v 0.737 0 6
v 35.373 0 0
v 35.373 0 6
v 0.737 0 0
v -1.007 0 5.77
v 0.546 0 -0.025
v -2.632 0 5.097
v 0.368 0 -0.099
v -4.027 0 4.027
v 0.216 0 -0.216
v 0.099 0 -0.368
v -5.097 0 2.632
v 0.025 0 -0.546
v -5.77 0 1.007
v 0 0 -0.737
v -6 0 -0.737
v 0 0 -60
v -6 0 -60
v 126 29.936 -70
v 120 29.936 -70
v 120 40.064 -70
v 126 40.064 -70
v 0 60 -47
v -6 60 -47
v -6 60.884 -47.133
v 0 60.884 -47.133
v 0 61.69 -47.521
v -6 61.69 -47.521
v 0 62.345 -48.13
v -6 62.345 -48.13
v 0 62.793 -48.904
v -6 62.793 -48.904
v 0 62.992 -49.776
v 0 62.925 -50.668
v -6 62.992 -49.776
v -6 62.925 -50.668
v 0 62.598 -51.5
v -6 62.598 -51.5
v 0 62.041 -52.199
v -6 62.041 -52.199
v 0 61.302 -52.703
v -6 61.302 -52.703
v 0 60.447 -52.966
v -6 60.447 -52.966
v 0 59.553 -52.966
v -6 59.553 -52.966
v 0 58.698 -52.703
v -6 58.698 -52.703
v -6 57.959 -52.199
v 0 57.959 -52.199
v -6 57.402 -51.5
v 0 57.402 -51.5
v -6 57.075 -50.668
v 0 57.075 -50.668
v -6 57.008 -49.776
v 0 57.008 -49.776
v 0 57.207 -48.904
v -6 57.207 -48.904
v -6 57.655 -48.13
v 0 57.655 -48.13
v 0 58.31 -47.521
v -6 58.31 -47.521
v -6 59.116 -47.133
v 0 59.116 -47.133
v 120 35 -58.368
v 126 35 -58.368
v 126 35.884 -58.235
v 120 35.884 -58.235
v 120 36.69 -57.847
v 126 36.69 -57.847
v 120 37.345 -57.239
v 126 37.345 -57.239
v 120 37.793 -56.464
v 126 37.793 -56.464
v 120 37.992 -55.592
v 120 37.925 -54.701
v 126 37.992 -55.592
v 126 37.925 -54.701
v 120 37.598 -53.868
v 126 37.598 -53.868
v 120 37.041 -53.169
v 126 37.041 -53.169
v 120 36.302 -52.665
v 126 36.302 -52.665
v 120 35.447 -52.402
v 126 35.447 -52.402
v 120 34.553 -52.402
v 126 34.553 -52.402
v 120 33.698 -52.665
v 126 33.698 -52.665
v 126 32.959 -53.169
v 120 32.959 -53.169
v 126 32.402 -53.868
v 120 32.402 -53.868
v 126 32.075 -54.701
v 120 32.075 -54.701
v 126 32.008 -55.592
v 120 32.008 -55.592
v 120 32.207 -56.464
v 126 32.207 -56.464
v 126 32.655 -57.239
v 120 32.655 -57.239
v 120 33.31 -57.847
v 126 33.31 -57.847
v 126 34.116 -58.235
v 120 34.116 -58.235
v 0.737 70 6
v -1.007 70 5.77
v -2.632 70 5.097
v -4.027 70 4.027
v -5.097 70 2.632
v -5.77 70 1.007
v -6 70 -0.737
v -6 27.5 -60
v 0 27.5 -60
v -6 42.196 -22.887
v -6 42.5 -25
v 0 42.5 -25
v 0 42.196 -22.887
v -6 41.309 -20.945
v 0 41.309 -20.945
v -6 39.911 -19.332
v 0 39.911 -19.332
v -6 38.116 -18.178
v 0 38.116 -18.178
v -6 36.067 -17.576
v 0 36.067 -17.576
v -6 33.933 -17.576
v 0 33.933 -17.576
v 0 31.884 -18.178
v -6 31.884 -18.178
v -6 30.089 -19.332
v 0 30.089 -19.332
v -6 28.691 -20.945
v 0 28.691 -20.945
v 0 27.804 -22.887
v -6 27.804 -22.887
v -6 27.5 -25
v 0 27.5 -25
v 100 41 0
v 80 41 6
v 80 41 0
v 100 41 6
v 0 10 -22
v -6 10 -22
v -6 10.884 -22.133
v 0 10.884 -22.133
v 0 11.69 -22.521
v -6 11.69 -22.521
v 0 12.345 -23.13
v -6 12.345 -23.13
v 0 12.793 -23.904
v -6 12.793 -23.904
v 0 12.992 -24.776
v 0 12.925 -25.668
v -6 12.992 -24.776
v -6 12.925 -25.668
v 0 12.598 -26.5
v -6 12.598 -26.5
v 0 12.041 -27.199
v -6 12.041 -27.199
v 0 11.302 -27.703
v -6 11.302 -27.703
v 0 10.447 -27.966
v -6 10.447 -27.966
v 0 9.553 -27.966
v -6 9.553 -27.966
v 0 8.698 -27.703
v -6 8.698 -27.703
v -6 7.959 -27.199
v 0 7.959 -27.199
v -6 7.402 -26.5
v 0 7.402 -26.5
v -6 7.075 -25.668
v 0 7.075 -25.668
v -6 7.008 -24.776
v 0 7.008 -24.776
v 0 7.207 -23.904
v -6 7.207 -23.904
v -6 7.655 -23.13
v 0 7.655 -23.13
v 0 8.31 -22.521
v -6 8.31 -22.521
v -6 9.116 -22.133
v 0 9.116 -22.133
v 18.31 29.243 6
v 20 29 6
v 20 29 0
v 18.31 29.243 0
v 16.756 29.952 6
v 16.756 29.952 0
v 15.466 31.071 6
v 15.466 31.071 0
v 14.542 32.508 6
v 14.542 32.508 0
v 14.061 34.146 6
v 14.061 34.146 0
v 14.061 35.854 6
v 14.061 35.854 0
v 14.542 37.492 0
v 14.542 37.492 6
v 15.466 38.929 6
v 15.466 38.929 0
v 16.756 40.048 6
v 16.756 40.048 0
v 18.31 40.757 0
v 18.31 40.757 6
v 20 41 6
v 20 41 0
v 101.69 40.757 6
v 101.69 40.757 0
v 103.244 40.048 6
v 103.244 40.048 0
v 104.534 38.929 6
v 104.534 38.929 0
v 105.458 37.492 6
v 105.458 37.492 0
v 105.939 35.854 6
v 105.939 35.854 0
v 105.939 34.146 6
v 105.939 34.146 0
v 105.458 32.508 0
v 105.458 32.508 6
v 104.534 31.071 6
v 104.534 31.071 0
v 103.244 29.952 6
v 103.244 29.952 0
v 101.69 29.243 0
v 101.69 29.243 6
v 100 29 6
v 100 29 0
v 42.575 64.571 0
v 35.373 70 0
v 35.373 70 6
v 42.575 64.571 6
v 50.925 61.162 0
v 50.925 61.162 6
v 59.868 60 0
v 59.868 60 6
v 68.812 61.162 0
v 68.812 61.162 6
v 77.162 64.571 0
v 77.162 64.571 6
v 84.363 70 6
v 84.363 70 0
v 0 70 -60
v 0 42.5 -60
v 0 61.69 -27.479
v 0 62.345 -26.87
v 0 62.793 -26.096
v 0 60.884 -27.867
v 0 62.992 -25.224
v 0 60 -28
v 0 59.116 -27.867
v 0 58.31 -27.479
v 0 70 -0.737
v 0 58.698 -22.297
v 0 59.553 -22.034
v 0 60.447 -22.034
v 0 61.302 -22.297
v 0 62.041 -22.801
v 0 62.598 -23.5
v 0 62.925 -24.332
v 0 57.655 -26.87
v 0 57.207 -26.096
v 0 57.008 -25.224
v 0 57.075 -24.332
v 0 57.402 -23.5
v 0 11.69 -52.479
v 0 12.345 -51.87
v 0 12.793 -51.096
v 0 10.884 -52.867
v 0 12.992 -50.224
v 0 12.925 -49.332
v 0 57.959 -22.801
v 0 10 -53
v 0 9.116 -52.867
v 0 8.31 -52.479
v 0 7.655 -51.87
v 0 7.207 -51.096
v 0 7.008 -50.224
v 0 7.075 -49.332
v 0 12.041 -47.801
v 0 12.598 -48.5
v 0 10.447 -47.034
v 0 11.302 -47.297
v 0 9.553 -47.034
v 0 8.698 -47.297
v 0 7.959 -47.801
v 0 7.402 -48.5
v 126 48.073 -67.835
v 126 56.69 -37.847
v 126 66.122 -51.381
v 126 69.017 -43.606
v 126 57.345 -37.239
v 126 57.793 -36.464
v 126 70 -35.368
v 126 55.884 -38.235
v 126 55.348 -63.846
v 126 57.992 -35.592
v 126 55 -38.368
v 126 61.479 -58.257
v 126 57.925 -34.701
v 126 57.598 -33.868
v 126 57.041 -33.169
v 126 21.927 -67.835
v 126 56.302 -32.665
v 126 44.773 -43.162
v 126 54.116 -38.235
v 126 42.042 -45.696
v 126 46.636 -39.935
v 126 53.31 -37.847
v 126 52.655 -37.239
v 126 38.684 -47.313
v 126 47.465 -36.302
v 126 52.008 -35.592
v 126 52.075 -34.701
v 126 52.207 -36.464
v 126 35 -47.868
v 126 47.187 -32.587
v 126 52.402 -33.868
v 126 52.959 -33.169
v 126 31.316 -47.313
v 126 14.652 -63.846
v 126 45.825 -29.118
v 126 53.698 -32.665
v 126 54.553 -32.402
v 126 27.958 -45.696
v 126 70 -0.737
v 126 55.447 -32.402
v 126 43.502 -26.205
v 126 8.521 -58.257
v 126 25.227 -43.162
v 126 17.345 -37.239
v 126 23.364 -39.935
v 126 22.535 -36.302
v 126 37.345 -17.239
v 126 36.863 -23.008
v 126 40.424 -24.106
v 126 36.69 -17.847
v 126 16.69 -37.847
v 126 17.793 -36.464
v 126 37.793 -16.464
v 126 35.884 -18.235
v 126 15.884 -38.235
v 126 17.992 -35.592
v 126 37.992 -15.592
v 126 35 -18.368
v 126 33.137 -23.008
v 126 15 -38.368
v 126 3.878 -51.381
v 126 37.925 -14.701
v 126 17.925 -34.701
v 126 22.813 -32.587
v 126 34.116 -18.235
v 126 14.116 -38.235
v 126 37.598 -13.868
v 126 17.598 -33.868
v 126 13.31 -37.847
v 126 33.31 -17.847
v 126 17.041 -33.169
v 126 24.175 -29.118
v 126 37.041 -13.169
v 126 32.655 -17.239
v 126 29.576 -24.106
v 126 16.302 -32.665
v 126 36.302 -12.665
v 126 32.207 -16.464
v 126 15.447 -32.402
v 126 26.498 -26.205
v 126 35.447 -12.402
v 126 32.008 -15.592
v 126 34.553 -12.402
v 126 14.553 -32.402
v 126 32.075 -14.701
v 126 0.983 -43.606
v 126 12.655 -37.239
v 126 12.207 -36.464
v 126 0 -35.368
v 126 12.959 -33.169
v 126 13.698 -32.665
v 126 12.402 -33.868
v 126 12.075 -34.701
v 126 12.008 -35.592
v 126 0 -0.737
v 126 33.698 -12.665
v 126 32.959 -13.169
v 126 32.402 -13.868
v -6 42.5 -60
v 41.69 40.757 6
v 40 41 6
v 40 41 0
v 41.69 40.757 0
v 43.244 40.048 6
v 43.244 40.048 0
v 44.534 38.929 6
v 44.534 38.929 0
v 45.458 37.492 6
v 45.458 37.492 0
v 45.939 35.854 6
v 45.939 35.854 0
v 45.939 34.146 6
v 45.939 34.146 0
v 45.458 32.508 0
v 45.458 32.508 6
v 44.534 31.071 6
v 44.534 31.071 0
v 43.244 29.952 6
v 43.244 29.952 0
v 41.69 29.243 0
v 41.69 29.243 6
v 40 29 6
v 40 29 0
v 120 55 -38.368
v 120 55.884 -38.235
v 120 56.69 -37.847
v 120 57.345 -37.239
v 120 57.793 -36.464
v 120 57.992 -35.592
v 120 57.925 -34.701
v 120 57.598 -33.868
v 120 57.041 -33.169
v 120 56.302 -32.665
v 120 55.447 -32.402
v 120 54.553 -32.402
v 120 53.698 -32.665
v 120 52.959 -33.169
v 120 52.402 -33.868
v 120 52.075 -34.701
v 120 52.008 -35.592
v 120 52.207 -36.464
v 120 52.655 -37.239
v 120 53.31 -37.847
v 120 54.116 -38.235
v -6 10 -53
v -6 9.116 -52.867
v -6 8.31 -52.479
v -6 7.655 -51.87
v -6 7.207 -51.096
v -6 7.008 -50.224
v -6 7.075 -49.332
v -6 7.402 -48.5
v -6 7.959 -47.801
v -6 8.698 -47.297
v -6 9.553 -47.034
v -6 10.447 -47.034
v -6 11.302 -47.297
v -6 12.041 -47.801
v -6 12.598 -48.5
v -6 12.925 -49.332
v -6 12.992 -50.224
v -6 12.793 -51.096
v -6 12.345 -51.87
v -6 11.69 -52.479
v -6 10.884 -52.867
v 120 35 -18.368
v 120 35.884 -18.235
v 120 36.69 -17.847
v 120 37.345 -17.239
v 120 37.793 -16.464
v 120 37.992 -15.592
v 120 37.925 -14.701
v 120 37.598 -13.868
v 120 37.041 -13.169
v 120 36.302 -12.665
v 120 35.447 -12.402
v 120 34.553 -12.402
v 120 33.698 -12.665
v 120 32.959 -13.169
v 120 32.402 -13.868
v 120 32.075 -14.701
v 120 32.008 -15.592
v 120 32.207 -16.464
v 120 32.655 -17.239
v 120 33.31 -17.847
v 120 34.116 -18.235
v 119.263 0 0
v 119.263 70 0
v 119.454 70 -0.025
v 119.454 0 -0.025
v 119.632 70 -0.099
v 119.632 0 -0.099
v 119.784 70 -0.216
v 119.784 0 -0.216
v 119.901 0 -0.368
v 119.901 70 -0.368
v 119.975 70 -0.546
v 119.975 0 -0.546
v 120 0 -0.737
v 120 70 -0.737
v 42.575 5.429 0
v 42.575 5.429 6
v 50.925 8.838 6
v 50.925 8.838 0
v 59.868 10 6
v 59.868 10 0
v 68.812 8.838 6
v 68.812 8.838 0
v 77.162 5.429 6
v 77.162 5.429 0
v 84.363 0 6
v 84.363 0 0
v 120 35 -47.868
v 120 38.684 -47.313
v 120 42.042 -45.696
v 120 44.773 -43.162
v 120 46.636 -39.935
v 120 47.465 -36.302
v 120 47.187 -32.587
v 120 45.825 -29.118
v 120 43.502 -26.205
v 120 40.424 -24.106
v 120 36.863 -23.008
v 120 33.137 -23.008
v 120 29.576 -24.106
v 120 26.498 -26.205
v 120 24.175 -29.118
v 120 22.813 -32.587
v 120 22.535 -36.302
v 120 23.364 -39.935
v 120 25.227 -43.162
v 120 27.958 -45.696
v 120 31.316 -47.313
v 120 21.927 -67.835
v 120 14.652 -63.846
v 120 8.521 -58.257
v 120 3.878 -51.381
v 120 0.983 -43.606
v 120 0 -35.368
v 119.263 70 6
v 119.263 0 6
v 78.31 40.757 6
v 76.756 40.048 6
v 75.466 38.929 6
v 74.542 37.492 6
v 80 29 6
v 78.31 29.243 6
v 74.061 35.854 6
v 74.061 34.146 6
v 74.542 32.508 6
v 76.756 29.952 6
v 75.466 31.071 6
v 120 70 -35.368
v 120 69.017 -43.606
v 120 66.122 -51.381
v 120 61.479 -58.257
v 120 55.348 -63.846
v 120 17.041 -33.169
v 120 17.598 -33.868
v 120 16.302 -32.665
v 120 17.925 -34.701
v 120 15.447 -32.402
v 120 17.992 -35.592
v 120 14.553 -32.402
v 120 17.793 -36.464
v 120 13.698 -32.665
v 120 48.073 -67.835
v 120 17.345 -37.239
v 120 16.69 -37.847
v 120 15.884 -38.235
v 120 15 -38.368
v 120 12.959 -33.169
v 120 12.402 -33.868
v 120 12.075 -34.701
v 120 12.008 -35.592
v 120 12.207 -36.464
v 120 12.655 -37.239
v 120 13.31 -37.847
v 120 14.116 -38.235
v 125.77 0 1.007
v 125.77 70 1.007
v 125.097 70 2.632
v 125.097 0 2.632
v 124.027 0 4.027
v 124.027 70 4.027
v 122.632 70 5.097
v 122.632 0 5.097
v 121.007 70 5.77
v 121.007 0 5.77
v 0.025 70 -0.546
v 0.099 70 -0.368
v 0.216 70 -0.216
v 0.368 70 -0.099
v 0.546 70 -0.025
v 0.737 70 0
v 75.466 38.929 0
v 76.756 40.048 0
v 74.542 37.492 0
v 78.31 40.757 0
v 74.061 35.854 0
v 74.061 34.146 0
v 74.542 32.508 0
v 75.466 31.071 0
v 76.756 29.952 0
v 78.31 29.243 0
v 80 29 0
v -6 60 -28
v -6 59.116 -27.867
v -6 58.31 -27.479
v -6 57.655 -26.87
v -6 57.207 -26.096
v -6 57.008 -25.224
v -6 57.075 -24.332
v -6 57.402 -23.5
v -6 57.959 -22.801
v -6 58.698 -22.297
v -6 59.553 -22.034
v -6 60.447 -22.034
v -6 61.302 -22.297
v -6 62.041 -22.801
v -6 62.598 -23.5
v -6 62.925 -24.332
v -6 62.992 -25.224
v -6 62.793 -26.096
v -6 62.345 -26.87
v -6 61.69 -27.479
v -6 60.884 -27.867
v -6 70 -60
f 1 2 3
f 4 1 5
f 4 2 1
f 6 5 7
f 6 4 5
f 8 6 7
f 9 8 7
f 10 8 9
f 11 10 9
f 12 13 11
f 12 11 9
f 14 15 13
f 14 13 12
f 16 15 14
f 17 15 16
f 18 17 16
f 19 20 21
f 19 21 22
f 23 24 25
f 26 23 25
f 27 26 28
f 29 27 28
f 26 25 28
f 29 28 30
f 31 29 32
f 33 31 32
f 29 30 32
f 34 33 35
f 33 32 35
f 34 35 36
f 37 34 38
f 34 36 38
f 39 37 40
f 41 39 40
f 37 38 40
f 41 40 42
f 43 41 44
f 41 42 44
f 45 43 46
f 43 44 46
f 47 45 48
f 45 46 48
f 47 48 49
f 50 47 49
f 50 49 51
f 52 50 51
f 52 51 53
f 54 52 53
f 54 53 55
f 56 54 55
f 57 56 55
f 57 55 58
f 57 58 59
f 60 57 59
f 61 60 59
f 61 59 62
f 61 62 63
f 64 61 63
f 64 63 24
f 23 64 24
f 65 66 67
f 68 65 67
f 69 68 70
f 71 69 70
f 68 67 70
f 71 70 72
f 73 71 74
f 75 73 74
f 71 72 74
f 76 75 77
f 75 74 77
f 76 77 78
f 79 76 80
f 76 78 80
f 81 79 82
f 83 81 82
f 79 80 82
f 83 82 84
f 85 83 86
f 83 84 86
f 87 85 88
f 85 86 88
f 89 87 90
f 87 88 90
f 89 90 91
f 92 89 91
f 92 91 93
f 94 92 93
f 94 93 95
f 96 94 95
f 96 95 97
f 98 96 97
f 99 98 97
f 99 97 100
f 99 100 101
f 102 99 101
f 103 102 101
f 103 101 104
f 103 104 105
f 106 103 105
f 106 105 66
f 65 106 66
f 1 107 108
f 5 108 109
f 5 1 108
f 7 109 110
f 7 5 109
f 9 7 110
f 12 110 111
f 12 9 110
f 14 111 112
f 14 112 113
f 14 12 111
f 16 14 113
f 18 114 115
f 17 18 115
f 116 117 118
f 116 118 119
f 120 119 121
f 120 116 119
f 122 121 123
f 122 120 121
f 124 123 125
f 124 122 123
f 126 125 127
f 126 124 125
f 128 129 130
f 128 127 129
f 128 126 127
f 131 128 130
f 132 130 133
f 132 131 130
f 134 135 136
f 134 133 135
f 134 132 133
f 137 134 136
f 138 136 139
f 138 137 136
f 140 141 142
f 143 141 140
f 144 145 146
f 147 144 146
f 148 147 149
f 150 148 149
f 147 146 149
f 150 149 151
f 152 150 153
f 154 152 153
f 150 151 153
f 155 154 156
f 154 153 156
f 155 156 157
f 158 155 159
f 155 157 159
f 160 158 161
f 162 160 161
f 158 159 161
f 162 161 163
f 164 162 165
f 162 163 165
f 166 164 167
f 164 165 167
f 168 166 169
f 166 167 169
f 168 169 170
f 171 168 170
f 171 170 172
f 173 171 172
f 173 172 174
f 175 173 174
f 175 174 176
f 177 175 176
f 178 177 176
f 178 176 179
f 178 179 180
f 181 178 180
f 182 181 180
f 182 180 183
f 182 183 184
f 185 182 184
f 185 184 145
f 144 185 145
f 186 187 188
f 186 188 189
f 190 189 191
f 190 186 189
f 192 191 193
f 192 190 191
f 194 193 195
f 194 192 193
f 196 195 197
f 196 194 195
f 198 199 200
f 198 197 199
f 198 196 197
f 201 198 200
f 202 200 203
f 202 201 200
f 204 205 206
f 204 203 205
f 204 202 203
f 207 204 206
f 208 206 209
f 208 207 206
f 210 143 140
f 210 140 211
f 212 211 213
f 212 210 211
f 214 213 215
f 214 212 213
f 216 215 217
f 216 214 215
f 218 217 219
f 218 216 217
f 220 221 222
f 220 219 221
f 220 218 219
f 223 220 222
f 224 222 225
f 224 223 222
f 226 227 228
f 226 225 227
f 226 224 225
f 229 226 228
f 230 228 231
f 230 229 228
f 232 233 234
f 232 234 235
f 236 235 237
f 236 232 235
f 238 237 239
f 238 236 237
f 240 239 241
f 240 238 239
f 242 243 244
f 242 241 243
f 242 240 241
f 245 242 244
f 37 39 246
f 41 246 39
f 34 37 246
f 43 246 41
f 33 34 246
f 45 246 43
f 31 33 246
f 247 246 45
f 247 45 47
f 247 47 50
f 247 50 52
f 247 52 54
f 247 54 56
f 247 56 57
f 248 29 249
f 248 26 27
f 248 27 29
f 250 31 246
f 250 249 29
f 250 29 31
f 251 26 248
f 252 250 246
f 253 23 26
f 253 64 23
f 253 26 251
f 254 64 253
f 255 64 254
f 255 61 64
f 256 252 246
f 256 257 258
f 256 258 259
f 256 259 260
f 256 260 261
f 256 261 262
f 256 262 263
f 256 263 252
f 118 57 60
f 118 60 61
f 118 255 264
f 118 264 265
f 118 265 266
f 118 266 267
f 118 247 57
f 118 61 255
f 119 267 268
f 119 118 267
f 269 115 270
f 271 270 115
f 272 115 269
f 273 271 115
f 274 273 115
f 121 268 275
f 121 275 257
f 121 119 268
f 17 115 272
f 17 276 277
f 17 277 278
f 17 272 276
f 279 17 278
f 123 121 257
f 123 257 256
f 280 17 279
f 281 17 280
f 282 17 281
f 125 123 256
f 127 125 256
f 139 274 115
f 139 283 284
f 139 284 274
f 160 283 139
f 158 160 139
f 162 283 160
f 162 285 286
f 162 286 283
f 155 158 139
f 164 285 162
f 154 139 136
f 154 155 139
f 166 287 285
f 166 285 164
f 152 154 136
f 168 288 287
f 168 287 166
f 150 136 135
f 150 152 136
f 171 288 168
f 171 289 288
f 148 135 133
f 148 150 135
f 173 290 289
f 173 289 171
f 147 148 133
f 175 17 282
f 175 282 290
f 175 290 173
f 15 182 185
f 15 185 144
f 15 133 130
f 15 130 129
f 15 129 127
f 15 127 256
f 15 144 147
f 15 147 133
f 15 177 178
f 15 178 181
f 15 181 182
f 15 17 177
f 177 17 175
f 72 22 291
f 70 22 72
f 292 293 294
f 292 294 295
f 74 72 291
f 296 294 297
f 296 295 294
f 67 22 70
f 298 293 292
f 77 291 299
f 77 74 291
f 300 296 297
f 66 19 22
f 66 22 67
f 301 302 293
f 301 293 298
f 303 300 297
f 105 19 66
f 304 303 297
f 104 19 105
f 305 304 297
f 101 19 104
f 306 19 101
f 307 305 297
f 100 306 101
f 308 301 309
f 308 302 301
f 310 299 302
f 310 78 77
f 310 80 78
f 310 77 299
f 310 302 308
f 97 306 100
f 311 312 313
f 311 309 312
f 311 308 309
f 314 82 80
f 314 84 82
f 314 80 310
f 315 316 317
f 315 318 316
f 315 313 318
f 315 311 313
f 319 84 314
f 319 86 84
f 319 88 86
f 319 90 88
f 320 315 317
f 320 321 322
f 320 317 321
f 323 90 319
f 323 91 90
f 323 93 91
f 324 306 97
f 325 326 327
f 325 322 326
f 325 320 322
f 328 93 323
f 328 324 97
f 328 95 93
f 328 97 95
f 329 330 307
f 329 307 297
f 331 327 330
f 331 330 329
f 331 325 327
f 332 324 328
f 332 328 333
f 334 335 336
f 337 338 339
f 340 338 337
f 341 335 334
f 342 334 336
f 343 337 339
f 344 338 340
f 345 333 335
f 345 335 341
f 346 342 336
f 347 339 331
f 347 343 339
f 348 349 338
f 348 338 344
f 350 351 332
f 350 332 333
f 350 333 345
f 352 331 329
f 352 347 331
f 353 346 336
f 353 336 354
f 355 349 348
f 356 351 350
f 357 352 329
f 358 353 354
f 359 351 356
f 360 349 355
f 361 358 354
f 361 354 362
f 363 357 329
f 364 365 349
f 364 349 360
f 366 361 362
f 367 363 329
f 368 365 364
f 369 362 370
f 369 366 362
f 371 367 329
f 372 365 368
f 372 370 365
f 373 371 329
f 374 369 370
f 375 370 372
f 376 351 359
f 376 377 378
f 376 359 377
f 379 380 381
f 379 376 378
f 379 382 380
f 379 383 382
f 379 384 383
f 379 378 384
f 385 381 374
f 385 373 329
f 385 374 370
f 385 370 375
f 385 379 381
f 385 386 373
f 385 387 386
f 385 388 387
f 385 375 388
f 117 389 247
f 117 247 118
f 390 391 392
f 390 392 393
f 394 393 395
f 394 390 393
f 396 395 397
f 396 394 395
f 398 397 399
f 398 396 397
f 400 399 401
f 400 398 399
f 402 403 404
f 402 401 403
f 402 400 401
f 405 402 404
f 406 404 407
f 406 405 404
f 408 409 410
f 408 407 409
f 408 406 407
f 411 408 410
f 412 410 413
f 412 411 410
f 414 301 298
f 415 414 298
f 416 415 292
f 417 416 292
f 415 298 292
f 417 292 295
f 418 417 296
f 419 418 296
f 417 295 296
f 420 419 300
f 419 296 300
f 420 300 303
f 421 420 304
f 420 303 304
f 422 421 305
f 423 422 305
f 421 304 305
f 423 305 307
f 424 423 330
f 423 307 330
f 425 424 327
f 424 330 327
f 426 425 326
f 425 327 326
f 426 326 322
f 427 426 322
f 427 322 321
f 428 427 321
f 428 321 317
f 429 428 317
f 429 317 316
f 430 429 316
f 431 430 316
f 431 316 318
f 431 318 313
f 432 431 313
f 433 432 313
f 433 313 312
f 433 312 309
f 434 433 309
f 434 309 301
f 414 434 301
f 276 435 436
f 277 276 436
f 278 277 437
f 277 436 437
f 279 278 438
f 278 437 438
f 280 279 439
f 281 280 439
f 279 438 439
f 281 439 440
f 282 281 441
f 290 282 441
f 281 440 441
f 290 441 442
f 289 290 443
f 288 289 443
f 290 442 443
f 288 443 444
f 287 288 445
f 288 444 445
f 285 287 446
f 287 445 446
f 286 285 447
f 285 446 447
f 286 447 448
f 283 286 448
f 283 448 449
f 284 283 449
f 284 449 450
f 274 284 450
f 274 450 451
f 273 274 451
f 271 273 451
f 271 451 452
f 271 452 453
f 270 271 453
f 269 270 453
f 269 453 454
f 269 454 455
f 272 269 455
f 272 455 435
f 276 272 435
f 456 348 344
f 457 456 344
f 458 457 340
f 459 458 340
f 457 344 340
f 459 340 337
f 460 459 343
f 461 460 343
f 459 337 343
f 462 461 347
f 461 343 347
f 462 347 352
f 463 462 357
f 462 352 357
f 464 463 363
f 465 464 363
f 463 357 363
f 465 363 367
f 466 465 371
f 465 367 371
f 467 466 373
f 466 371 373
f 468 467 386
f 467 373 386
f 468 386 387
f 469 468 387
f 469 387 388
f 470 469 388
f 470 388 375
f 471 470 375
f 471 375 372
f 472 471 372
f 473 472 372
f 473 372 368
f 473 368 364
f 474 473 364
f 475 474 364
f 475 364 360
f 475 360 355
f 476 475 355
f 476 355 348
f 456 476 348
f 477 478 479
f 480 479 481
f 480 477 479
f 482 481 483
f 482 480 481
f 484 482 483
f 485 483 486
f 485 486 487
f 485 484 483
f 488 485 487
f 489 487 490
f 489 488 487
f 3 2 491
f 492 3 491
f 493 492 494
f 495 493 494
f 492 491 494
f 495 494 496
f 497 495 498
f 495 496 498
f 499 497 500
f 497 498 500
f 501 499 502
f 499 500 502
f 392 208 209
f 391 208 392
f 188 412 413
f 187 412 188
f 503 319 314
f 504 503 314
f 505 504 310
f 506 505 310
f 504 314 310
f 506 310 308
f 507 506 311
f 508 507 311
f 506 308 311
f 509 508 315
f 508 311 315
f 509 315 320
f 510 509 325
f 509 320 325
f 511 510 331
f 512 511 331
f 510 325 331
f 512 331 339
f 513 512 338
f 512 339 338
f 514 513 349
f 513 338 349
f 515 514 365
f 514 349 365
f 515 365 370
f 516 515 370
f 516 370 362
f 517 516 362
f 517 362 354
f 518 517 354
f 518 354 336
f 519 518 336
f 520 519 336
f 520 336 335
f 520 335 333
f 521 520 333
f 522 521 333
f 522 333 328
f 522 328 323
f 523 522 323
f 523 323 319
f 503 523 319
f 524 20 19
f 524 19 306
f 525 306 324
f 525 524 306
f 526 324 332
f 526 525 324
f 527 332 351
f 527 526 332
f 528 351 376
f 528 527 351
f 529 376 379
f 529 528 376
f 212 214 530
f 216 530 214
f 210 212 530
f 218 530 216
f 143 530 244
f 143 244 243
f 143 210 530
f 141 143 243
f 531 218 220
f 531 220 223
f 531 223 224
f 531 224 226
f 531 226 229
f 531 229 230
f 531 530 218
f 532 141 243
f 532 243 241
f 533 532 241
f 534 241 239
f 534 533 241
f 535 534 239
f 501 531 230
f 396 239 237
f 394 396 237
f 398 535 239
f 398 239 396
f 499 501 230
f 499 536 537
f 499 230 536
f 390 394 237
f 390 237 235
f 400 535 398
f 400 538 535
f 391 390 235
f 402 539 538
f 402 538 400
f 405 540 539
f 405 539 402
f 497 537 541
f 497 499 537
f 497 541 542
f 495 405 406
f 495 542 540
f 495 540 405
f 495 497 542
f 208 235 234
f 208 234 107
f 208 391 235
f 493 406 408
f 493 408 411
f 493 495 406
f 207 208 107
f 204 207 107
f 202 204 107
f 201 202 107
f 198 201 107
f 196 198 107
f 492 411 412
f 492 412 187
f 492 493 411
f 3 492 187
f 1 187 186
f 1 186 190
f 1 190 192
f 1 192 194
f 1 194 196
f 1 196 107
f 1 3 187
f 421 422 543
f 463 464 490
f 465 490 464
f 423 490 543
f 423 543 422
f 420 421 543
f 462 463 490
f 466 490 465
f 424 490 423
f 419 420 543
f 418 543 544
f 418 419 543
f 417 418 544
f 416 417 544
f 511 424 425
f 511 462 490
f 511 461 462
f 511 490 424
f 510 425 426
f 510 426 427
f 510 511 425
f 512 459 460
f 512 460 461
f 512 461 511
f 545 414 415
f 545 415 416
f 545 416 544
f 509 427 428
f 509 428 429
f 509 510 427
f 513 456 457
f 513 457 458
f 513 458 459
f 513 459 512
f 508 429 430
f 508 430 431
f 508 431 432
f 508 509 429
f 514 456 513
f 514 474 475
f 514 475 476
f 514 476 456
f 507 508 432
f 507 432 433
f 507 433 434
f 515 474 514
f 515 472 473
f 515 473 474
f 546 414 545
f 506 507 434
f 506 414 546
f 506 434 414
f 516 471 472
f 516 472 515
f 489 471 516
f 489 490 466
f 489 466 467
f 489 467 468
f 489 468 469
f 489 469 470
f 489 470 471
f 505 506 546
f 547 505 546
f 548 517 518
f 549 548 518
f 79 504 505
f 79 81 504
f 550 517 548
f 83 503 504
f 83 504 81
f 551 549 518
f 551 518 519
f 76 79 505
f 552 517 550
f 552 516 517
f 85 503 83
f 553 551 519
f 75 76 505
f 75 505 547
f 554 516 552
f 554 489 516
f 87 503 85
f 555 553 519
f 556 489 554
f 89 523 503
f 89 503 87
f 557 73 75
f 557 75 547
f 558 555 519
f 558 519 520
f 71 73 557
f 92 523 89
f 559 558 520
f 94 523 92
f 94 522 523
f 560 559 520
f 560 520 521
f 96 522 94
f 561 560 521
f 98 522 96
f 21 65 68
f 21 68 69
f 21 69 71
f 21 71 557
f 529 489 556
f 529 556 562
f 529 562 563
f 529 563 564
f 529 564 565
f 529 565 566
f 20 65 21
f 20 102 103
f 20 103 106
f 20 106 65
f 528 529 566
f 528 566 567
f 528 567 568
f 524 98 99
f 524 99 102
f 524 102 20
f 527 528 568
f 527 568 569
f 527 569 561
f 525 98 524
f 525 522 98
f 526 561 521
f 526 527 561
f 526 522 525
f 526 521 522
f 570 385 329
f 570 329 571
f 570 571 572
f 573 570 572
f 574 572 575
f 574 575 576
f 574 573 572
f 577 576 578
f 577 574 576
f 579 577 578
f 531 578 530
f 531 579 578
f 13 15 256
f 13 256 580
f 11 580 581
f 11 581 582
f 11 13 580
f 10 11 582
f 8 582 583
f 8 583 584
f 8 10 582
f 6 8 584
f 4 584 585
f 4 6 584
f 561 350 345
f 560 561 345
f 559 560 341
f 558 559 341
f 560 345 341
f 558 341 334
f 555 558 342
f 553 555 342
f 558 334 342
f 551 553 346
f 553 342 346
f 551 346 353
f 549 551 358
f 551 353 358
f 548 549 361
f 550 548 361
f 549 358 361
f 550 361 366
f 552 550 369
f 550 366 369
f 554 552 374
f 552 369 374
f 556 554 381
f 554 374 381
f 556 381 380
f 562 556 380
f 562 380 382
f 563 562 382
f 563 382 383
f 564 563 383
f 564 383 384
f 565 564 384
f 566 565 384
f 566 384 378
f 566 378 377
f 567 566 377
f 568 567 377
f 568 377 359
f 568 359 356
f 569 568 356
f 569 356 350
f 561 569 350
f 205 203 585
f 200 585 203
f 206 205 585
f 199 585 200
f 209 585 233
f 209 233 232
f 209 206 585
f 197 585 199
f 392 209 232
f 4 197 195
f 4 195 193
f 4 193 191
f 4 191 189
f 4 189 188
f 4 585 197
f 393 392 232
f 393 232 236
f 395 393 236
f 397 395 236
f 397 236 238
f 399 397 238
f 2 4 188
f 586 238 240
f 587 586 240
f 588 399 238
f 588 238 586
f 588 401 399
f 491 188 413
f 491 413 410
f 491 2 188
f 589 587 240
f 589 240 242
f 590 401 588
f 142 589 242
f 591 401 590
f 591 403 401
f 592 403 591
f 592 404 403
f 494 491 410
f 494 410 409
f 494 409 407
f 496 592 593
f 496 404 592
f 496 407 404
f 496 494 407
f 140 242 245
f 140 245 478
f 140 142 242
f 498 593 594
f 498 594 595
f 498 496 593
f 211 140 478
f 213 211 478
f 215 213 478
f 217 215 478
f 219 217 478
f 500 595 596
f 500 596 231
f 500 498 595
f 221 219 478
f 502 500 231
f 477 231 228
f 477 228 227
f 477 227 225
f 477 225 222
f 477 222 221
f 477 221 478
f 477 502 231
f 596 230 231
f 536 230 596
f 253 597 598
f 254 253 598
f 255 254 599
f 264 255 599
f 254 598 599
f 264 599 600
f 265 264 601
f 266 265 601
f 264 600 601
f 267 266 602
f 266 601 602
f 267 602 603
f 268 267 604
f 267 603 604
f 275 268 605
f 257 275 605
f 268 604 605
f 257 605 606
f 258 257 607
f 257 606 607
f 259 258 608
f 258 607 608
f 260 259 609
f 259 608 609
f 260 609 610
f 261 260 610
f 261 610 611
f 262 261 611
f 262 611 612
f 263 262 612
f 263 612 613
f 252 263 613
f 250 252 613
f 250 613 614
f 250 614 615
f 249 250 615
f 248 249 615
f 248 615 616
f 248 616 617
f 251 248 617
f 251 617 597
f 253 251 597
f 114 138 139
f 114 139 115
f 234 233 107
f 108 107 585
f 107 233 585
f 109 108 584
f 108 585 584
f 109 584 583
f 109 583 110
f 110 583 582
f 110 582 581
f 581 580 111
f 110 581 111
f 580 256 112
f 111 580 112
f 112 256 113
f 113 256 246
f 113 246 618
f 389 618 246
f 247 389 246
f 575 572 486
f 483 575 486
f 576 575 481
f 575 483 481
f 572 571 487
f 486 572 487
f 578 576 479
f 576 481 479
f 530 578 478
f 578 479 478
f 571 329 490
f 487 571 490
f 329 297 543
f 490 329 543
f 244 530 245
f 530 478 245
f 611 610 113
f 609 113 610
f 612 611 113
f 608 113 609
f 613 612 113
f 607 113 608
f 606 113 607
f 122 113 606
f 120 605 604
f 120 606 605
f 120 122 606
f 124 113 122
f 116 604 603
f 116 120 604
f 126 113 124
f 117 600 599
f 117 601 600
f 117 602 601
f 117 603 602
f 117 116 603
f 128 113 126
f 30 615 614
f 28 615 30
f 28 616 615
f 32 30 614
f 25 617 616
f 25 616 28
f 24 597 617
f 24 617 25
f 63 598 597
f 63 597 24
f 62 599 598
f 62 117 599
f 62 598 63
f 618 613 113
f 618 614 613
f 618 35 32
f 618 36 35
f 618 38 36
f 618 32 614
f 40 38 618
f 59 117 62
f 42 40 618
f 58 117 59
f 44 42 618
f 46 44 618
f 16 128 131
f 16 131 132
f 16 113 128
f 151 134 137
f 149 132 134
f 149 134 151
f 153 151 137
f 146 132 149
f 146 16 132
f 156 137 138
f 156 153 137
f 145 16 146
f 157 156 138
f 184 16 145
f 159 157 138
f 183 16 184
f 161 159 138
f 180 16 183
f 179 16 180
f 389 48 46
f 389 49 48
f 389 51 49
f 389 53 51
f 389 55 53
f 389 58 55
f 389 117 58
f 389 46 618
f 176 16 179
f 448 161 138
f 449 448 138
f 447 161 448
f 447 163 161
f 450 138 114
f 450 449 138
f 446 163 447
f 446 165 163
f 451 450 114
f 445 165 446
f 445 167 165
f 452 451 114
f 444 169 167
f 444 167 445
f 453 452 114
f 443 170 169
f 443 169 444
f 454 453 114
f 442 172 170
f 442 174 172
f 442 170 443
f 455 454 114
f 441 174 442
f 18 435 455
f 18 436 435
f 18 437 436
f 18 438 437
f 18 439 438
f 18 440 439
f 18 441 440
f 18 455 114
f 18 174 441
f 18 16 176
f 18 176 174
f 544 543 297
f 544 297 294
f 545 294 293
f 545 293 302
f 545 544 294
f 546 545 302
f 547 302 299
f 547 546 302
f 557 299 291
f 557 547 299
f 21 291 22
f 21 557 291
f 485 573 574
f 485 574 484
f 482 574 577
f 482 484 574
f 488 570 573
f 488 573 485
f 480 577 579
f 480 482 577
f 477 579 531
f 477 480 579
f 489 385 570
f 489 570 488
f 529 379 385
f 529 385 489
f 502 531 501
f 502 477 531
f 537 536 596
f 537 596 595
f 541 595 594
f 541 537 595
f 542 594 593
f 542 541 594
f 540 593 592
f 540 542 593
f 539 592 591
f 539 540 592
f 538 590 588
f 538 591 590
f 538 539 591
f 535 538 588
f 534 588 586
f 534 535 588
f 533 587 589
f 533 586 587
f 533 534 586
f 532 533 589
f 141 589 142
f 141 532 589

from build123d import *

# Parameters (mm, degrees)
BASE_FLANGE1_DEPTH = 70
CUT_EXTRUDE1_DEPTH = 10
CUT_EXTRUDE3_START = -6
CUT_EXTRUDE3_DEPTH = 6
SKETCH8_R          = 12.5
SKETCH8_R_2        = 3
CUT_EXTRUDE4_DEPTH = 10
CUT_EXTRUDE6_DEPTH = 10
SKETCH12_R         = 3
CUT_EXTRUDE7_DEPTH = 10


# Read off the part's stored shape, not the designer's step: Cut-Extrude3
# Sheet-metal steps are written as plain solids
with BuildPart() as part:
    # Sketch1 → Base-Flange1 (new body)
    with BuildSketch(Plane(origin=(0, 0, 0), x_dir=(1, 0, 0), z_dir=(0, 1, 0))):
        with BuildLine():
            Line((0, 60), (0, 0.7366))
            ThreePointArc((0, 0.7366), (0.215745145, 0.215745145), (0.7366, 0))
            Line((0.7366, 0), (119.2634, 0))
            ThreePointArc((119.2634, 0), (119.784254855, 0.215745145), (120, 0.7366))
            Line((120, 0.7366), (120, 70))
            Line((120, 70), (126, 70))
            Line((126, 70), (126, 0.7366))
            ThreePointArc((126, 0.7366), (124.026895542, -4.026895542), (119.2634, -6))
            Line((119.2634, -6), (0.7366, -6))
            ThreePointArc((0.7366, -6), (-4.026895542, -4.026895542), (-6, 0.7366))
            Line((-6, 0.7366), (-6, 60))
            Line((-6, 60), (0, 60))
        make_face()
    extrude(amount=BASE_FLANGE1_DEPTH)

    # Sketch6 → Cut-Extrude1 (cut)
    with BuildSketch(Plane.XY.offset(6)):
        with BuildLine():
            Line((40, 29), (20, 29))
            ThreePointArc((20, 29), (14, 35), (20, 41))
            Line((20, 41), (40, 41))
            ThreePointArc((40, 41), (46, 35), (40, 29))
        make_face()
        with BuildLine():
            Line((80, 41), (100, 41))
            ThreePointArc((100, 41), (106, 35), (100, 29))
            Line((100, 29), (80, 29))
            ThreePointArc((80, 29), (74, 35), (80, 41))
        make_face()
    extrude(amount=-CUT_EXTRUDE1_DEPTH, mode=Mode.SUBTRACT)

    # Cut-Extrude3 outline → Cut-Extrude3 (cut)
    with BuildSketch(Plane(origin=(126, 0, 0), x_dir=(0, 0, -1), z_dir=(1, 0, 0)).offset(CUT_EXTRUDE3_START)):
        with BuildLine():
            Line((70, 0), (70, 29.935875682))
            ThreePointArc((70, 29.935875682), (58.256677497, 8.521288257), (35.3683, 0))
            Line((35.3683, 0), (70, 0))
        make_face()
        with BuildLine():
            ThreePointArc((35.3683, 70), (58.256677497, 61.478711743), (70, 40.064124318))
            Line((70, 40.064124318), (70, 70))
            Line((70, 70), (35.3683, 70))
        make_face()
    extrude(amount=CUT_EXTRUDE3_DEPTH, mode=Mode.SUBTRACT)

    # Sketch8 → Cut-Extrude4 (cut)
    with BuildSketch(Plane(origin=(126, 0, 0), x_dir=(0, 0, -1), z_dir=(1, 0, 0))):
        with Locations((35.3683, 35)):
            Circle(SKETCH8_R)
        with Locations((35.3683, 55)):
            Circle(SKETCH8_R_2)
        with Locations((55.3683, 35)):
            Circle(SKETCH8_R_2)
        with Locations((35.3683, 15)):
            Circle(SKETCH8_R_2)
        with Locations((15.3683, 35)):
            Circle(SKETCH8_R_2)
    extrude(amount=-CUT_EXTRUDE4_DEPTH, mode=Mode.SUBTRACT)

    # Sketch9 → Cut-Extrude6 (cut)
    with BuildSketch(Plane(origin=(0, 0, 0), x_dir=(-1, 0, 0), z_dir=(0, 0, -1))):
        with BuildLine():
            Line((-84.363131417, 70), (-35.373336561, 70))
            ThreePointArc((-35.373336561, 70), (-59.868233989, 60), (-84.363131417, 70))
        make_face()
        with BuildLine():
            Line((-84.363131417, 0), (-35.373336561, 0))
            ThreePointArc((-35.373336561, 0), (-59.868233989, 10), (-84.363131417, 0))
        make_face()
    extrude(amount=-CUT_EXTRUDE6_DEPTH, mode=Mode.SUBTRACT)

    # Sketch12 → Cut-Extrude7 (cut)
    with BuildSketch(Plane.ZY.offset(6)):
        with Locations((-50, 60)):
            Circle(SKETCH12_R)
        with Locations(Location((-25, 60, 0), (0, 0, 180))):
            Circle(SKETCH12_R)
        with Locations((-25, 10)):
            Circle(SKETCH12_R)
        with Locations(Location((-50, 10, 0), (0, 0, 180))):
            Circle(SKETCH12_R)
        with BuildLine():
            Line((-60, 42.5), (-25, 42.5))
            ThreePointArc((-25, 42.5), (-17.5, 35), (-25, 27.5))
            Line((-25, 27.5), (-60, 27.5))
            Line((-60, 27.5), (-60, 42.5))
        make_face()
    extrude(amount=-CUT_EXTRUDE7_DEPTH, mode=Mode.SUBTRACT)


solid = part.part
